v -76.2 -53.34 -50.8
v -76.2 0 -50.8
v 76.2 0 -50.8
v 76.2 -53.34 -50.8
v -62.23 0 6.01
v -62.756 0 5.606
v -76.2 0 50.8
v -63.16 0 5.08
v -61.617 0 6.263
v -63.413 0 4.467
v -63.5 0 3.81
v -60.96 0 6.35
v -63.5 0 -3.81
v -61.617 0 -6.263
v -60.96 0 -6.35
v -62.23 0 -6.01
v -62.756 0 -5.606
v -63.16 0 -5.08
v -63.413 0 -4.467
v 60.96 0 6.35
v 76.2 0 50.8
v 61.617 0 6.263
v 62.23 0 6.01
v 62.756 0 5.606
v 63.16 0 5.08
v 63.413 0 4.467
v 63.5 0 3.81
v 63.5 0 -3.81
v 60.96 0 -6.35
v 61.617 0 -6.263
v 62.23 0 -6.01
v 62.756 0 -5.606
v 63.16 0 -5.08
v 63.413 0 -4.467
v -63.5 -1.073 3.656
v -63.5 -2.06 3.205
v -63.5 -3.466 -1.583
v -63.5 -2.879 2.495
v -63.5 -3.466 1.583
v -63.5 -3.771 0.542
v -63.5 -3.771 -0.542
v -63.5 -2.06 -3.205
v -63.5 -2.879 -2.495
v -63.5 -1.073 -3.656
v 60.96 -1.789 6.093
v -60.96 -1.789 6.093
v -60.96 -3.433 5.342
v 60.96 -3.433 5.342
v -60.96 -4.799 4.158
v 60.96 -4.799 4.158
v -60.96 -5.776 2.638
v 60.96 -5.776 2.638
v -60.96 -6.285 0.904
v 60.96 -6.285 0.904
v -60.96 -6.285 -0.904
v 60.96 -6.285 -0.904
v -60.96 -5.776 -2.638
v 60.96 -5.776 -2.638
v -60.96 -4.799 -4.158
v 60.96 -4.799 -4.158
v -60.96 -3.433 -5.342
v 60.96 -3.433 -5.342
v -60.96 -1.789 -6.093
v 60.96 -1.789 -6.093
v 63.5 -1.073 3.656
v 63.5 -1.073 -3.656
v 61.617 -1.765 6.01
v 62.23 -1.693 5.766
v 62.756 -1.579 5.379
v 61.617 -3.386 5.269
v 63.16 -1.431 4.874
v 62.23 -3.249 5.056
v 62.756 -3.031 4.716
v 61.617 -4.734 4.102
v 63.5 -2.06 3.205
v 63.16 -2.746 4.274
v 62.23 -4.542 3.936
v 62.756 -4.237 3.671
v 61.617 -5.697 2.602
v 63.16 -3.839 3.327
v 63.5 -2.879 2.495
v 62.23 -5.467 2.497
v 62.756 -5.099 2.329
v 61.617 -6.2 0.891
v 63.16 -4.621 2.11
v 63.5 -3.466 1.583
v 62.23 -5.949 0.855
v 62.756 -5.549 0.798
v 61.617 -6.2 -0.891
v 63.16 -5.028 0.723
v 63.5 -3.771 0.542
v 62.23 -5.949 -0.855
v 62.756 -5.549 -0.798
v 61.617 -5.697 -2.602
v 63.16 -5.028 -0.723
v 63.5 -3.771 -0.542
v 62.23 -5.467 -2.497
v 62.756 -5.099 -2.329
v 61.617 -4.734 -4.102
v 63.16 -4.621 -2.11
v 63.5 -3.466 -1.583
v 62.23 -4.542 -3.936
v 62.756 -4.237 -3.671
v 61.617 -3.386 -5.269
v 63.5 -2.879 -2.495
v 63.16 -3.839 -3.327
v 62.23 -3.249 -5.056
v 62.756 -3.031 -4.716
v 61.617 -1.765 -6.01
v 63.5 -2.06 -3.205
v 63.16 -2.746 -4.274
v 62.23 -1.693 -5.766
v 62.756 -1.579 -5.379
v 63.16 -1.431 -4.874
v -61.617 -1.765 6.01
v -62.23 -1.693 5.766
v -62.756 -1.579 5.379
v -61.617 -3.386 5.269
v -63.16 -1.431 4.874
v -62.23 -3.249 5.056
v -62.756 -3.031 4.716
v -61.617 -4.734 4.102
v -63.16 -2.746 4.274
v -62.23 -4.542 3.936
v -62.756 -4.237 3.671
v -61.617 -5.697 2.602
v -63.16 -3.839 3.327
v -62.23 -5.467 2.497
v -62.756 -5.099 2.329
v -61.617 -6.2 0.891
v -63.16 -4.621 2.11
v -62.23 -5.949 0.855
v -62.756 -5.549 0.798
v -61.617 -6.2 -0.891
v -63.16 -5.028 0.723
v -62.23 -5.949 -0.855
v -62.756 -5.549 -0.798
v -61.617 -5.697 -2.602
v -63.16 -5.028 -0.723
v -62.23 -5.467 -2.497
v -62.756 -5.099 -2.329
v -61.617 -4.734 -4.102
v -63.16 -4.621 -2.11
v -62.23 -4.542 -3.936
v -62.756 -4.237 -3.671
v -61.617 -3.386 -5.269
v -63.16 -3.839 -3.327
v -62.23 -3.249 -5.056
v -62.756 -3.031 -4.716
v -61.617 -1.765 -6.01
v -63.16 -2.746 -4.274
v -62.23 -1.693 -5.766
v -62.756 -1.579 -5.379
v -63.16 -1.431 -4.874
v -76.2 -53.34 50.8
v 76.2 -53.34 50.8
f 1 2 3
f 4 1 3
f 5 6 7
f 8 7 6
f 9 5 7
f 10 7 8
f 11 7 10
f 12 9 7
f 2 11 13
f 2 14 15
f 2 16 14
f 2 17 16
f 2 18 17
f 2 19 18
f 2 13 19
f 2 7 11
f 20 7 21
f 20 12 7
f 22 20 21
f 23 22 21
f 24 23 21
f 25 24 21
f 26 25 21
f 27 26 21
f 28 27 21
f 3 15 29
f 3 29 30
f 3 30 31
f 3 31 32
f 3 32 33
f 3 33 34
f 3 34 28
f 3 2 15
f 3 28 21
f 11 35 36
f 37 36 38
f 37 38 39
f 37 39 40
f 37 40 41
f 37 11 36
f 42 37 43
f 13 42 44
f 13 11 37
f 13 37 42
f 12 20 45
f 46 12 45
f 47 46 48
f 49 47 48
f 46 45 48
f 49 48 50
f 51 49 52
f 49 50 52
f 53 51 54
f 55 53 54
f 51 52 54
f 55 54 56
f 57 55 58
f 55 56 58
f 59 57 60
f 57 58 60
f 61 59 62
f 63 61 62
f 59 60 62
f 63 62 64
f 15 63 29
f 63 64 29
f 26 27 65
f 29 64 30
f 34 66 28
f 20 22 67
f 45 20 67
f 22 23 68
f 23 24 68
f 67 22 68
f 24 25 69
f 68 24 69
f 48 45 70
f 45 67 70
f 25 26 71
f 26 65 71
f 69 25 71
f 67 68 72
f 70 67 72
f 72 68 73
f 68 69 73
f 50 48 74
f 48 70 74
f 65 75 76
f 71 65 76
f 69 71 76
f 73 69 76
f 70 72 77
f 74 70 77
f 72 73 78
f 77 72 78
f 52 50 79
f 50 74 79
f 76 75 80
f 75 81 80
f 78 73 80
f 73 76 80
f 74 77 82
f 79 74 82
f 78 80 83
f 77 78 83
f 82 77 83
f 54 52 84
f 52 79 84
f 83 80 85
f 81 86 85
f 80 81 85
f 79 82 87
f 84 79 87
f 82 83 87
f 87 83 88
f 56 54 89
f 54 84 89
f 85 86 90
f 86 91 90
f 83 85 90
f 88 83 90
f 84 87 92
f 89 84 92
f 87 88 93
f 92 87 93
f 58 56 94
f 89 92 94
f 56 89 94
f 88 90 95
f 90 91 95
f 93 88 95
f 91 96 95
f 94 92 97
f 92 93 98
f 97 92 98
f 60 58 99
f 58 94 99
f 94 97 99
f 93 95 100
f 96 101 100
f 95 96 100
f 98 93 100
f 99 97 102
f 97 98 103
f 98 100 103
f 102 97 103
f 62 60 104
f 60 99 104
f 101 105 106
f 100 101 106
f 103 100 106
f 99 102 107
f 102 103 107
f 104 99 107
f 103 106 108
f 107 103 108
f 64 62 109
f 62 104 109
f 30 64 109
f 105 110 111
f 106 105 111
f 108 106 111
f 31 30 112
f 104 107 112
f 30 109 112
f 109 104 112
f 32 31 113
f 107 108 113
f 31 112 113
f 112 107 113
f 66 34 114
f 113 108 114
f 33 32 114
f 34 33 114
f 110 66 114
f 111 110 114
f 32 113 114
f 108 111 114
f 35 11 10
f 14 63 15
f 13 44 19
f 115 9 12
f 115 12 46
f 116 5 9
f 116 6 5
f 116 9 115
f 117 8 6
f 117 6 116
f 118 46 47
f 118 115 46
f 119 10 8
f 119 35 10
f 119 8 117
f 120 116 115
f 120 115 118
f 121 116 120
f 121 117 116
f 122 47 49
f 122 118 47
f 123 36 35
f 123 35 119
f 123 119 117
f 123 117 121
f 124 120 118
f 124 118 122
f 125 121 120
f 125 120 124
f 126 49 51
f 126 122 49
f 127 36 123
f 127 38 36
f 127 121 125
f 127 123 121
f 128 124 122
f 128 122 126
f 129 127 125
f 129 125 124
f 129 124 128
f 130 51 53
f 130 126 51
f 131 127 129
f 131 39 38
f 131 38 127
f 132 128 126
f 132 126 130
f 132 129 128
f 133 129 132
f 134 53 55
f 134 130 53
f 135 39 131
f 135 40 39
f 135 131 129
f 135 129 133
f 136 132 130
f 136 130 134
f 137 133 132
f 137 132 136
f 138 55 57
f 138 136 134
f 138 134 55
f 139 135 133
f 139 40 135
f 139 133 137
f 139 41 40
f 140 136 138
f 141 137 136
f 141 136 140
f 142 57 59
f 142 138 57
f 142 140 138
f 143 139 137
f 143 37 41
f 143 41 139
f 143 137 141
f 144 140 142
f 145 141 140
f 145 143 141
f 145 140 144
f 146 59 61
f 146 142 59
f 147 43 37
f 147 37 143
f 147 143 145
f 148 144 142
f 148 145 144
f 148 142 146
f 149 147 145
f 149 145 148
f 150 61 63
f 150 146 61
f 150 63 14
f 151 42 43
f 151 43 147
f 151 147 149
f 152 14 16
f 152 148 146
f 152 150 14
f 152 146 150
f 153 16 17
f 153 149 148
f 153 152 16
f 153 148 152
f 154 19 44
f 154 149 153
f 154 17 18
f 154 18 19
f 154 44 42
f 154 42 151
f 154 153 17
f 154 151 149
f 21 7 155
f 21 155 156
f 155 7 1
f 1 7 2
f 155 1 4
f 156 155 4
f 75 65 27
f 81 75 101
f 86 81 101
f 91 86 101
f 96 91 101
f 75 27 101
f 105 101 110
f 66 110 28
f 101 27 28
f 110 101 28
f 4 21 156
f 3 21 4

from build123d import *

# Parameters (mm, degrees)
SKETCH1_W           = 152.4
SKETCH1_H           = 101.6
BOSS_EXTRUDE1_DEPTH = 53.34
CUT_EXTRUDE1_START  = -12.7
SKETCH2_R           = 6.35
CUT_EXTRUDE1_DEPTH  = 127
FILLET2_R           = 2.54


with BuildPart() as part:
    # Sketch1 → Boss-Extrude1 (new body)
    with BuildSketch(Plane(origin=(0, 0, 0), x_dir=(1, 0, 0), z_dir=(0, 1, 0))):
        Rectangle(SKETCH1_W, SKETCH1_H)
    extrude(amount=-BOSS_EXTRUDE1_DEPTH)

    # Sketch2 → Cut-Extrude1 (cut)
    with BuildSketch(Plane(origin=(76.2, 0, 0), x_dir=(0, 0, -1), z_dir=(1, 0, 0)).offset(CUT_EXTRUDE1_START)):
        Circle(SKETCH2_R)
    extrude(amount=-CUT_EXTRUDE1_DEPTH, mode=Mode.SUBTRACT)

    # Fillet2
    fillet2_edges = [part.edges().sort_by_distance(p)[0] for p in [
        (63.5, -6.35, 0),
        (-63.5, -6.35, 0),
    ]]
    fillet(fillet2_edges, radius=FILLET2_R)


solid = part.part
